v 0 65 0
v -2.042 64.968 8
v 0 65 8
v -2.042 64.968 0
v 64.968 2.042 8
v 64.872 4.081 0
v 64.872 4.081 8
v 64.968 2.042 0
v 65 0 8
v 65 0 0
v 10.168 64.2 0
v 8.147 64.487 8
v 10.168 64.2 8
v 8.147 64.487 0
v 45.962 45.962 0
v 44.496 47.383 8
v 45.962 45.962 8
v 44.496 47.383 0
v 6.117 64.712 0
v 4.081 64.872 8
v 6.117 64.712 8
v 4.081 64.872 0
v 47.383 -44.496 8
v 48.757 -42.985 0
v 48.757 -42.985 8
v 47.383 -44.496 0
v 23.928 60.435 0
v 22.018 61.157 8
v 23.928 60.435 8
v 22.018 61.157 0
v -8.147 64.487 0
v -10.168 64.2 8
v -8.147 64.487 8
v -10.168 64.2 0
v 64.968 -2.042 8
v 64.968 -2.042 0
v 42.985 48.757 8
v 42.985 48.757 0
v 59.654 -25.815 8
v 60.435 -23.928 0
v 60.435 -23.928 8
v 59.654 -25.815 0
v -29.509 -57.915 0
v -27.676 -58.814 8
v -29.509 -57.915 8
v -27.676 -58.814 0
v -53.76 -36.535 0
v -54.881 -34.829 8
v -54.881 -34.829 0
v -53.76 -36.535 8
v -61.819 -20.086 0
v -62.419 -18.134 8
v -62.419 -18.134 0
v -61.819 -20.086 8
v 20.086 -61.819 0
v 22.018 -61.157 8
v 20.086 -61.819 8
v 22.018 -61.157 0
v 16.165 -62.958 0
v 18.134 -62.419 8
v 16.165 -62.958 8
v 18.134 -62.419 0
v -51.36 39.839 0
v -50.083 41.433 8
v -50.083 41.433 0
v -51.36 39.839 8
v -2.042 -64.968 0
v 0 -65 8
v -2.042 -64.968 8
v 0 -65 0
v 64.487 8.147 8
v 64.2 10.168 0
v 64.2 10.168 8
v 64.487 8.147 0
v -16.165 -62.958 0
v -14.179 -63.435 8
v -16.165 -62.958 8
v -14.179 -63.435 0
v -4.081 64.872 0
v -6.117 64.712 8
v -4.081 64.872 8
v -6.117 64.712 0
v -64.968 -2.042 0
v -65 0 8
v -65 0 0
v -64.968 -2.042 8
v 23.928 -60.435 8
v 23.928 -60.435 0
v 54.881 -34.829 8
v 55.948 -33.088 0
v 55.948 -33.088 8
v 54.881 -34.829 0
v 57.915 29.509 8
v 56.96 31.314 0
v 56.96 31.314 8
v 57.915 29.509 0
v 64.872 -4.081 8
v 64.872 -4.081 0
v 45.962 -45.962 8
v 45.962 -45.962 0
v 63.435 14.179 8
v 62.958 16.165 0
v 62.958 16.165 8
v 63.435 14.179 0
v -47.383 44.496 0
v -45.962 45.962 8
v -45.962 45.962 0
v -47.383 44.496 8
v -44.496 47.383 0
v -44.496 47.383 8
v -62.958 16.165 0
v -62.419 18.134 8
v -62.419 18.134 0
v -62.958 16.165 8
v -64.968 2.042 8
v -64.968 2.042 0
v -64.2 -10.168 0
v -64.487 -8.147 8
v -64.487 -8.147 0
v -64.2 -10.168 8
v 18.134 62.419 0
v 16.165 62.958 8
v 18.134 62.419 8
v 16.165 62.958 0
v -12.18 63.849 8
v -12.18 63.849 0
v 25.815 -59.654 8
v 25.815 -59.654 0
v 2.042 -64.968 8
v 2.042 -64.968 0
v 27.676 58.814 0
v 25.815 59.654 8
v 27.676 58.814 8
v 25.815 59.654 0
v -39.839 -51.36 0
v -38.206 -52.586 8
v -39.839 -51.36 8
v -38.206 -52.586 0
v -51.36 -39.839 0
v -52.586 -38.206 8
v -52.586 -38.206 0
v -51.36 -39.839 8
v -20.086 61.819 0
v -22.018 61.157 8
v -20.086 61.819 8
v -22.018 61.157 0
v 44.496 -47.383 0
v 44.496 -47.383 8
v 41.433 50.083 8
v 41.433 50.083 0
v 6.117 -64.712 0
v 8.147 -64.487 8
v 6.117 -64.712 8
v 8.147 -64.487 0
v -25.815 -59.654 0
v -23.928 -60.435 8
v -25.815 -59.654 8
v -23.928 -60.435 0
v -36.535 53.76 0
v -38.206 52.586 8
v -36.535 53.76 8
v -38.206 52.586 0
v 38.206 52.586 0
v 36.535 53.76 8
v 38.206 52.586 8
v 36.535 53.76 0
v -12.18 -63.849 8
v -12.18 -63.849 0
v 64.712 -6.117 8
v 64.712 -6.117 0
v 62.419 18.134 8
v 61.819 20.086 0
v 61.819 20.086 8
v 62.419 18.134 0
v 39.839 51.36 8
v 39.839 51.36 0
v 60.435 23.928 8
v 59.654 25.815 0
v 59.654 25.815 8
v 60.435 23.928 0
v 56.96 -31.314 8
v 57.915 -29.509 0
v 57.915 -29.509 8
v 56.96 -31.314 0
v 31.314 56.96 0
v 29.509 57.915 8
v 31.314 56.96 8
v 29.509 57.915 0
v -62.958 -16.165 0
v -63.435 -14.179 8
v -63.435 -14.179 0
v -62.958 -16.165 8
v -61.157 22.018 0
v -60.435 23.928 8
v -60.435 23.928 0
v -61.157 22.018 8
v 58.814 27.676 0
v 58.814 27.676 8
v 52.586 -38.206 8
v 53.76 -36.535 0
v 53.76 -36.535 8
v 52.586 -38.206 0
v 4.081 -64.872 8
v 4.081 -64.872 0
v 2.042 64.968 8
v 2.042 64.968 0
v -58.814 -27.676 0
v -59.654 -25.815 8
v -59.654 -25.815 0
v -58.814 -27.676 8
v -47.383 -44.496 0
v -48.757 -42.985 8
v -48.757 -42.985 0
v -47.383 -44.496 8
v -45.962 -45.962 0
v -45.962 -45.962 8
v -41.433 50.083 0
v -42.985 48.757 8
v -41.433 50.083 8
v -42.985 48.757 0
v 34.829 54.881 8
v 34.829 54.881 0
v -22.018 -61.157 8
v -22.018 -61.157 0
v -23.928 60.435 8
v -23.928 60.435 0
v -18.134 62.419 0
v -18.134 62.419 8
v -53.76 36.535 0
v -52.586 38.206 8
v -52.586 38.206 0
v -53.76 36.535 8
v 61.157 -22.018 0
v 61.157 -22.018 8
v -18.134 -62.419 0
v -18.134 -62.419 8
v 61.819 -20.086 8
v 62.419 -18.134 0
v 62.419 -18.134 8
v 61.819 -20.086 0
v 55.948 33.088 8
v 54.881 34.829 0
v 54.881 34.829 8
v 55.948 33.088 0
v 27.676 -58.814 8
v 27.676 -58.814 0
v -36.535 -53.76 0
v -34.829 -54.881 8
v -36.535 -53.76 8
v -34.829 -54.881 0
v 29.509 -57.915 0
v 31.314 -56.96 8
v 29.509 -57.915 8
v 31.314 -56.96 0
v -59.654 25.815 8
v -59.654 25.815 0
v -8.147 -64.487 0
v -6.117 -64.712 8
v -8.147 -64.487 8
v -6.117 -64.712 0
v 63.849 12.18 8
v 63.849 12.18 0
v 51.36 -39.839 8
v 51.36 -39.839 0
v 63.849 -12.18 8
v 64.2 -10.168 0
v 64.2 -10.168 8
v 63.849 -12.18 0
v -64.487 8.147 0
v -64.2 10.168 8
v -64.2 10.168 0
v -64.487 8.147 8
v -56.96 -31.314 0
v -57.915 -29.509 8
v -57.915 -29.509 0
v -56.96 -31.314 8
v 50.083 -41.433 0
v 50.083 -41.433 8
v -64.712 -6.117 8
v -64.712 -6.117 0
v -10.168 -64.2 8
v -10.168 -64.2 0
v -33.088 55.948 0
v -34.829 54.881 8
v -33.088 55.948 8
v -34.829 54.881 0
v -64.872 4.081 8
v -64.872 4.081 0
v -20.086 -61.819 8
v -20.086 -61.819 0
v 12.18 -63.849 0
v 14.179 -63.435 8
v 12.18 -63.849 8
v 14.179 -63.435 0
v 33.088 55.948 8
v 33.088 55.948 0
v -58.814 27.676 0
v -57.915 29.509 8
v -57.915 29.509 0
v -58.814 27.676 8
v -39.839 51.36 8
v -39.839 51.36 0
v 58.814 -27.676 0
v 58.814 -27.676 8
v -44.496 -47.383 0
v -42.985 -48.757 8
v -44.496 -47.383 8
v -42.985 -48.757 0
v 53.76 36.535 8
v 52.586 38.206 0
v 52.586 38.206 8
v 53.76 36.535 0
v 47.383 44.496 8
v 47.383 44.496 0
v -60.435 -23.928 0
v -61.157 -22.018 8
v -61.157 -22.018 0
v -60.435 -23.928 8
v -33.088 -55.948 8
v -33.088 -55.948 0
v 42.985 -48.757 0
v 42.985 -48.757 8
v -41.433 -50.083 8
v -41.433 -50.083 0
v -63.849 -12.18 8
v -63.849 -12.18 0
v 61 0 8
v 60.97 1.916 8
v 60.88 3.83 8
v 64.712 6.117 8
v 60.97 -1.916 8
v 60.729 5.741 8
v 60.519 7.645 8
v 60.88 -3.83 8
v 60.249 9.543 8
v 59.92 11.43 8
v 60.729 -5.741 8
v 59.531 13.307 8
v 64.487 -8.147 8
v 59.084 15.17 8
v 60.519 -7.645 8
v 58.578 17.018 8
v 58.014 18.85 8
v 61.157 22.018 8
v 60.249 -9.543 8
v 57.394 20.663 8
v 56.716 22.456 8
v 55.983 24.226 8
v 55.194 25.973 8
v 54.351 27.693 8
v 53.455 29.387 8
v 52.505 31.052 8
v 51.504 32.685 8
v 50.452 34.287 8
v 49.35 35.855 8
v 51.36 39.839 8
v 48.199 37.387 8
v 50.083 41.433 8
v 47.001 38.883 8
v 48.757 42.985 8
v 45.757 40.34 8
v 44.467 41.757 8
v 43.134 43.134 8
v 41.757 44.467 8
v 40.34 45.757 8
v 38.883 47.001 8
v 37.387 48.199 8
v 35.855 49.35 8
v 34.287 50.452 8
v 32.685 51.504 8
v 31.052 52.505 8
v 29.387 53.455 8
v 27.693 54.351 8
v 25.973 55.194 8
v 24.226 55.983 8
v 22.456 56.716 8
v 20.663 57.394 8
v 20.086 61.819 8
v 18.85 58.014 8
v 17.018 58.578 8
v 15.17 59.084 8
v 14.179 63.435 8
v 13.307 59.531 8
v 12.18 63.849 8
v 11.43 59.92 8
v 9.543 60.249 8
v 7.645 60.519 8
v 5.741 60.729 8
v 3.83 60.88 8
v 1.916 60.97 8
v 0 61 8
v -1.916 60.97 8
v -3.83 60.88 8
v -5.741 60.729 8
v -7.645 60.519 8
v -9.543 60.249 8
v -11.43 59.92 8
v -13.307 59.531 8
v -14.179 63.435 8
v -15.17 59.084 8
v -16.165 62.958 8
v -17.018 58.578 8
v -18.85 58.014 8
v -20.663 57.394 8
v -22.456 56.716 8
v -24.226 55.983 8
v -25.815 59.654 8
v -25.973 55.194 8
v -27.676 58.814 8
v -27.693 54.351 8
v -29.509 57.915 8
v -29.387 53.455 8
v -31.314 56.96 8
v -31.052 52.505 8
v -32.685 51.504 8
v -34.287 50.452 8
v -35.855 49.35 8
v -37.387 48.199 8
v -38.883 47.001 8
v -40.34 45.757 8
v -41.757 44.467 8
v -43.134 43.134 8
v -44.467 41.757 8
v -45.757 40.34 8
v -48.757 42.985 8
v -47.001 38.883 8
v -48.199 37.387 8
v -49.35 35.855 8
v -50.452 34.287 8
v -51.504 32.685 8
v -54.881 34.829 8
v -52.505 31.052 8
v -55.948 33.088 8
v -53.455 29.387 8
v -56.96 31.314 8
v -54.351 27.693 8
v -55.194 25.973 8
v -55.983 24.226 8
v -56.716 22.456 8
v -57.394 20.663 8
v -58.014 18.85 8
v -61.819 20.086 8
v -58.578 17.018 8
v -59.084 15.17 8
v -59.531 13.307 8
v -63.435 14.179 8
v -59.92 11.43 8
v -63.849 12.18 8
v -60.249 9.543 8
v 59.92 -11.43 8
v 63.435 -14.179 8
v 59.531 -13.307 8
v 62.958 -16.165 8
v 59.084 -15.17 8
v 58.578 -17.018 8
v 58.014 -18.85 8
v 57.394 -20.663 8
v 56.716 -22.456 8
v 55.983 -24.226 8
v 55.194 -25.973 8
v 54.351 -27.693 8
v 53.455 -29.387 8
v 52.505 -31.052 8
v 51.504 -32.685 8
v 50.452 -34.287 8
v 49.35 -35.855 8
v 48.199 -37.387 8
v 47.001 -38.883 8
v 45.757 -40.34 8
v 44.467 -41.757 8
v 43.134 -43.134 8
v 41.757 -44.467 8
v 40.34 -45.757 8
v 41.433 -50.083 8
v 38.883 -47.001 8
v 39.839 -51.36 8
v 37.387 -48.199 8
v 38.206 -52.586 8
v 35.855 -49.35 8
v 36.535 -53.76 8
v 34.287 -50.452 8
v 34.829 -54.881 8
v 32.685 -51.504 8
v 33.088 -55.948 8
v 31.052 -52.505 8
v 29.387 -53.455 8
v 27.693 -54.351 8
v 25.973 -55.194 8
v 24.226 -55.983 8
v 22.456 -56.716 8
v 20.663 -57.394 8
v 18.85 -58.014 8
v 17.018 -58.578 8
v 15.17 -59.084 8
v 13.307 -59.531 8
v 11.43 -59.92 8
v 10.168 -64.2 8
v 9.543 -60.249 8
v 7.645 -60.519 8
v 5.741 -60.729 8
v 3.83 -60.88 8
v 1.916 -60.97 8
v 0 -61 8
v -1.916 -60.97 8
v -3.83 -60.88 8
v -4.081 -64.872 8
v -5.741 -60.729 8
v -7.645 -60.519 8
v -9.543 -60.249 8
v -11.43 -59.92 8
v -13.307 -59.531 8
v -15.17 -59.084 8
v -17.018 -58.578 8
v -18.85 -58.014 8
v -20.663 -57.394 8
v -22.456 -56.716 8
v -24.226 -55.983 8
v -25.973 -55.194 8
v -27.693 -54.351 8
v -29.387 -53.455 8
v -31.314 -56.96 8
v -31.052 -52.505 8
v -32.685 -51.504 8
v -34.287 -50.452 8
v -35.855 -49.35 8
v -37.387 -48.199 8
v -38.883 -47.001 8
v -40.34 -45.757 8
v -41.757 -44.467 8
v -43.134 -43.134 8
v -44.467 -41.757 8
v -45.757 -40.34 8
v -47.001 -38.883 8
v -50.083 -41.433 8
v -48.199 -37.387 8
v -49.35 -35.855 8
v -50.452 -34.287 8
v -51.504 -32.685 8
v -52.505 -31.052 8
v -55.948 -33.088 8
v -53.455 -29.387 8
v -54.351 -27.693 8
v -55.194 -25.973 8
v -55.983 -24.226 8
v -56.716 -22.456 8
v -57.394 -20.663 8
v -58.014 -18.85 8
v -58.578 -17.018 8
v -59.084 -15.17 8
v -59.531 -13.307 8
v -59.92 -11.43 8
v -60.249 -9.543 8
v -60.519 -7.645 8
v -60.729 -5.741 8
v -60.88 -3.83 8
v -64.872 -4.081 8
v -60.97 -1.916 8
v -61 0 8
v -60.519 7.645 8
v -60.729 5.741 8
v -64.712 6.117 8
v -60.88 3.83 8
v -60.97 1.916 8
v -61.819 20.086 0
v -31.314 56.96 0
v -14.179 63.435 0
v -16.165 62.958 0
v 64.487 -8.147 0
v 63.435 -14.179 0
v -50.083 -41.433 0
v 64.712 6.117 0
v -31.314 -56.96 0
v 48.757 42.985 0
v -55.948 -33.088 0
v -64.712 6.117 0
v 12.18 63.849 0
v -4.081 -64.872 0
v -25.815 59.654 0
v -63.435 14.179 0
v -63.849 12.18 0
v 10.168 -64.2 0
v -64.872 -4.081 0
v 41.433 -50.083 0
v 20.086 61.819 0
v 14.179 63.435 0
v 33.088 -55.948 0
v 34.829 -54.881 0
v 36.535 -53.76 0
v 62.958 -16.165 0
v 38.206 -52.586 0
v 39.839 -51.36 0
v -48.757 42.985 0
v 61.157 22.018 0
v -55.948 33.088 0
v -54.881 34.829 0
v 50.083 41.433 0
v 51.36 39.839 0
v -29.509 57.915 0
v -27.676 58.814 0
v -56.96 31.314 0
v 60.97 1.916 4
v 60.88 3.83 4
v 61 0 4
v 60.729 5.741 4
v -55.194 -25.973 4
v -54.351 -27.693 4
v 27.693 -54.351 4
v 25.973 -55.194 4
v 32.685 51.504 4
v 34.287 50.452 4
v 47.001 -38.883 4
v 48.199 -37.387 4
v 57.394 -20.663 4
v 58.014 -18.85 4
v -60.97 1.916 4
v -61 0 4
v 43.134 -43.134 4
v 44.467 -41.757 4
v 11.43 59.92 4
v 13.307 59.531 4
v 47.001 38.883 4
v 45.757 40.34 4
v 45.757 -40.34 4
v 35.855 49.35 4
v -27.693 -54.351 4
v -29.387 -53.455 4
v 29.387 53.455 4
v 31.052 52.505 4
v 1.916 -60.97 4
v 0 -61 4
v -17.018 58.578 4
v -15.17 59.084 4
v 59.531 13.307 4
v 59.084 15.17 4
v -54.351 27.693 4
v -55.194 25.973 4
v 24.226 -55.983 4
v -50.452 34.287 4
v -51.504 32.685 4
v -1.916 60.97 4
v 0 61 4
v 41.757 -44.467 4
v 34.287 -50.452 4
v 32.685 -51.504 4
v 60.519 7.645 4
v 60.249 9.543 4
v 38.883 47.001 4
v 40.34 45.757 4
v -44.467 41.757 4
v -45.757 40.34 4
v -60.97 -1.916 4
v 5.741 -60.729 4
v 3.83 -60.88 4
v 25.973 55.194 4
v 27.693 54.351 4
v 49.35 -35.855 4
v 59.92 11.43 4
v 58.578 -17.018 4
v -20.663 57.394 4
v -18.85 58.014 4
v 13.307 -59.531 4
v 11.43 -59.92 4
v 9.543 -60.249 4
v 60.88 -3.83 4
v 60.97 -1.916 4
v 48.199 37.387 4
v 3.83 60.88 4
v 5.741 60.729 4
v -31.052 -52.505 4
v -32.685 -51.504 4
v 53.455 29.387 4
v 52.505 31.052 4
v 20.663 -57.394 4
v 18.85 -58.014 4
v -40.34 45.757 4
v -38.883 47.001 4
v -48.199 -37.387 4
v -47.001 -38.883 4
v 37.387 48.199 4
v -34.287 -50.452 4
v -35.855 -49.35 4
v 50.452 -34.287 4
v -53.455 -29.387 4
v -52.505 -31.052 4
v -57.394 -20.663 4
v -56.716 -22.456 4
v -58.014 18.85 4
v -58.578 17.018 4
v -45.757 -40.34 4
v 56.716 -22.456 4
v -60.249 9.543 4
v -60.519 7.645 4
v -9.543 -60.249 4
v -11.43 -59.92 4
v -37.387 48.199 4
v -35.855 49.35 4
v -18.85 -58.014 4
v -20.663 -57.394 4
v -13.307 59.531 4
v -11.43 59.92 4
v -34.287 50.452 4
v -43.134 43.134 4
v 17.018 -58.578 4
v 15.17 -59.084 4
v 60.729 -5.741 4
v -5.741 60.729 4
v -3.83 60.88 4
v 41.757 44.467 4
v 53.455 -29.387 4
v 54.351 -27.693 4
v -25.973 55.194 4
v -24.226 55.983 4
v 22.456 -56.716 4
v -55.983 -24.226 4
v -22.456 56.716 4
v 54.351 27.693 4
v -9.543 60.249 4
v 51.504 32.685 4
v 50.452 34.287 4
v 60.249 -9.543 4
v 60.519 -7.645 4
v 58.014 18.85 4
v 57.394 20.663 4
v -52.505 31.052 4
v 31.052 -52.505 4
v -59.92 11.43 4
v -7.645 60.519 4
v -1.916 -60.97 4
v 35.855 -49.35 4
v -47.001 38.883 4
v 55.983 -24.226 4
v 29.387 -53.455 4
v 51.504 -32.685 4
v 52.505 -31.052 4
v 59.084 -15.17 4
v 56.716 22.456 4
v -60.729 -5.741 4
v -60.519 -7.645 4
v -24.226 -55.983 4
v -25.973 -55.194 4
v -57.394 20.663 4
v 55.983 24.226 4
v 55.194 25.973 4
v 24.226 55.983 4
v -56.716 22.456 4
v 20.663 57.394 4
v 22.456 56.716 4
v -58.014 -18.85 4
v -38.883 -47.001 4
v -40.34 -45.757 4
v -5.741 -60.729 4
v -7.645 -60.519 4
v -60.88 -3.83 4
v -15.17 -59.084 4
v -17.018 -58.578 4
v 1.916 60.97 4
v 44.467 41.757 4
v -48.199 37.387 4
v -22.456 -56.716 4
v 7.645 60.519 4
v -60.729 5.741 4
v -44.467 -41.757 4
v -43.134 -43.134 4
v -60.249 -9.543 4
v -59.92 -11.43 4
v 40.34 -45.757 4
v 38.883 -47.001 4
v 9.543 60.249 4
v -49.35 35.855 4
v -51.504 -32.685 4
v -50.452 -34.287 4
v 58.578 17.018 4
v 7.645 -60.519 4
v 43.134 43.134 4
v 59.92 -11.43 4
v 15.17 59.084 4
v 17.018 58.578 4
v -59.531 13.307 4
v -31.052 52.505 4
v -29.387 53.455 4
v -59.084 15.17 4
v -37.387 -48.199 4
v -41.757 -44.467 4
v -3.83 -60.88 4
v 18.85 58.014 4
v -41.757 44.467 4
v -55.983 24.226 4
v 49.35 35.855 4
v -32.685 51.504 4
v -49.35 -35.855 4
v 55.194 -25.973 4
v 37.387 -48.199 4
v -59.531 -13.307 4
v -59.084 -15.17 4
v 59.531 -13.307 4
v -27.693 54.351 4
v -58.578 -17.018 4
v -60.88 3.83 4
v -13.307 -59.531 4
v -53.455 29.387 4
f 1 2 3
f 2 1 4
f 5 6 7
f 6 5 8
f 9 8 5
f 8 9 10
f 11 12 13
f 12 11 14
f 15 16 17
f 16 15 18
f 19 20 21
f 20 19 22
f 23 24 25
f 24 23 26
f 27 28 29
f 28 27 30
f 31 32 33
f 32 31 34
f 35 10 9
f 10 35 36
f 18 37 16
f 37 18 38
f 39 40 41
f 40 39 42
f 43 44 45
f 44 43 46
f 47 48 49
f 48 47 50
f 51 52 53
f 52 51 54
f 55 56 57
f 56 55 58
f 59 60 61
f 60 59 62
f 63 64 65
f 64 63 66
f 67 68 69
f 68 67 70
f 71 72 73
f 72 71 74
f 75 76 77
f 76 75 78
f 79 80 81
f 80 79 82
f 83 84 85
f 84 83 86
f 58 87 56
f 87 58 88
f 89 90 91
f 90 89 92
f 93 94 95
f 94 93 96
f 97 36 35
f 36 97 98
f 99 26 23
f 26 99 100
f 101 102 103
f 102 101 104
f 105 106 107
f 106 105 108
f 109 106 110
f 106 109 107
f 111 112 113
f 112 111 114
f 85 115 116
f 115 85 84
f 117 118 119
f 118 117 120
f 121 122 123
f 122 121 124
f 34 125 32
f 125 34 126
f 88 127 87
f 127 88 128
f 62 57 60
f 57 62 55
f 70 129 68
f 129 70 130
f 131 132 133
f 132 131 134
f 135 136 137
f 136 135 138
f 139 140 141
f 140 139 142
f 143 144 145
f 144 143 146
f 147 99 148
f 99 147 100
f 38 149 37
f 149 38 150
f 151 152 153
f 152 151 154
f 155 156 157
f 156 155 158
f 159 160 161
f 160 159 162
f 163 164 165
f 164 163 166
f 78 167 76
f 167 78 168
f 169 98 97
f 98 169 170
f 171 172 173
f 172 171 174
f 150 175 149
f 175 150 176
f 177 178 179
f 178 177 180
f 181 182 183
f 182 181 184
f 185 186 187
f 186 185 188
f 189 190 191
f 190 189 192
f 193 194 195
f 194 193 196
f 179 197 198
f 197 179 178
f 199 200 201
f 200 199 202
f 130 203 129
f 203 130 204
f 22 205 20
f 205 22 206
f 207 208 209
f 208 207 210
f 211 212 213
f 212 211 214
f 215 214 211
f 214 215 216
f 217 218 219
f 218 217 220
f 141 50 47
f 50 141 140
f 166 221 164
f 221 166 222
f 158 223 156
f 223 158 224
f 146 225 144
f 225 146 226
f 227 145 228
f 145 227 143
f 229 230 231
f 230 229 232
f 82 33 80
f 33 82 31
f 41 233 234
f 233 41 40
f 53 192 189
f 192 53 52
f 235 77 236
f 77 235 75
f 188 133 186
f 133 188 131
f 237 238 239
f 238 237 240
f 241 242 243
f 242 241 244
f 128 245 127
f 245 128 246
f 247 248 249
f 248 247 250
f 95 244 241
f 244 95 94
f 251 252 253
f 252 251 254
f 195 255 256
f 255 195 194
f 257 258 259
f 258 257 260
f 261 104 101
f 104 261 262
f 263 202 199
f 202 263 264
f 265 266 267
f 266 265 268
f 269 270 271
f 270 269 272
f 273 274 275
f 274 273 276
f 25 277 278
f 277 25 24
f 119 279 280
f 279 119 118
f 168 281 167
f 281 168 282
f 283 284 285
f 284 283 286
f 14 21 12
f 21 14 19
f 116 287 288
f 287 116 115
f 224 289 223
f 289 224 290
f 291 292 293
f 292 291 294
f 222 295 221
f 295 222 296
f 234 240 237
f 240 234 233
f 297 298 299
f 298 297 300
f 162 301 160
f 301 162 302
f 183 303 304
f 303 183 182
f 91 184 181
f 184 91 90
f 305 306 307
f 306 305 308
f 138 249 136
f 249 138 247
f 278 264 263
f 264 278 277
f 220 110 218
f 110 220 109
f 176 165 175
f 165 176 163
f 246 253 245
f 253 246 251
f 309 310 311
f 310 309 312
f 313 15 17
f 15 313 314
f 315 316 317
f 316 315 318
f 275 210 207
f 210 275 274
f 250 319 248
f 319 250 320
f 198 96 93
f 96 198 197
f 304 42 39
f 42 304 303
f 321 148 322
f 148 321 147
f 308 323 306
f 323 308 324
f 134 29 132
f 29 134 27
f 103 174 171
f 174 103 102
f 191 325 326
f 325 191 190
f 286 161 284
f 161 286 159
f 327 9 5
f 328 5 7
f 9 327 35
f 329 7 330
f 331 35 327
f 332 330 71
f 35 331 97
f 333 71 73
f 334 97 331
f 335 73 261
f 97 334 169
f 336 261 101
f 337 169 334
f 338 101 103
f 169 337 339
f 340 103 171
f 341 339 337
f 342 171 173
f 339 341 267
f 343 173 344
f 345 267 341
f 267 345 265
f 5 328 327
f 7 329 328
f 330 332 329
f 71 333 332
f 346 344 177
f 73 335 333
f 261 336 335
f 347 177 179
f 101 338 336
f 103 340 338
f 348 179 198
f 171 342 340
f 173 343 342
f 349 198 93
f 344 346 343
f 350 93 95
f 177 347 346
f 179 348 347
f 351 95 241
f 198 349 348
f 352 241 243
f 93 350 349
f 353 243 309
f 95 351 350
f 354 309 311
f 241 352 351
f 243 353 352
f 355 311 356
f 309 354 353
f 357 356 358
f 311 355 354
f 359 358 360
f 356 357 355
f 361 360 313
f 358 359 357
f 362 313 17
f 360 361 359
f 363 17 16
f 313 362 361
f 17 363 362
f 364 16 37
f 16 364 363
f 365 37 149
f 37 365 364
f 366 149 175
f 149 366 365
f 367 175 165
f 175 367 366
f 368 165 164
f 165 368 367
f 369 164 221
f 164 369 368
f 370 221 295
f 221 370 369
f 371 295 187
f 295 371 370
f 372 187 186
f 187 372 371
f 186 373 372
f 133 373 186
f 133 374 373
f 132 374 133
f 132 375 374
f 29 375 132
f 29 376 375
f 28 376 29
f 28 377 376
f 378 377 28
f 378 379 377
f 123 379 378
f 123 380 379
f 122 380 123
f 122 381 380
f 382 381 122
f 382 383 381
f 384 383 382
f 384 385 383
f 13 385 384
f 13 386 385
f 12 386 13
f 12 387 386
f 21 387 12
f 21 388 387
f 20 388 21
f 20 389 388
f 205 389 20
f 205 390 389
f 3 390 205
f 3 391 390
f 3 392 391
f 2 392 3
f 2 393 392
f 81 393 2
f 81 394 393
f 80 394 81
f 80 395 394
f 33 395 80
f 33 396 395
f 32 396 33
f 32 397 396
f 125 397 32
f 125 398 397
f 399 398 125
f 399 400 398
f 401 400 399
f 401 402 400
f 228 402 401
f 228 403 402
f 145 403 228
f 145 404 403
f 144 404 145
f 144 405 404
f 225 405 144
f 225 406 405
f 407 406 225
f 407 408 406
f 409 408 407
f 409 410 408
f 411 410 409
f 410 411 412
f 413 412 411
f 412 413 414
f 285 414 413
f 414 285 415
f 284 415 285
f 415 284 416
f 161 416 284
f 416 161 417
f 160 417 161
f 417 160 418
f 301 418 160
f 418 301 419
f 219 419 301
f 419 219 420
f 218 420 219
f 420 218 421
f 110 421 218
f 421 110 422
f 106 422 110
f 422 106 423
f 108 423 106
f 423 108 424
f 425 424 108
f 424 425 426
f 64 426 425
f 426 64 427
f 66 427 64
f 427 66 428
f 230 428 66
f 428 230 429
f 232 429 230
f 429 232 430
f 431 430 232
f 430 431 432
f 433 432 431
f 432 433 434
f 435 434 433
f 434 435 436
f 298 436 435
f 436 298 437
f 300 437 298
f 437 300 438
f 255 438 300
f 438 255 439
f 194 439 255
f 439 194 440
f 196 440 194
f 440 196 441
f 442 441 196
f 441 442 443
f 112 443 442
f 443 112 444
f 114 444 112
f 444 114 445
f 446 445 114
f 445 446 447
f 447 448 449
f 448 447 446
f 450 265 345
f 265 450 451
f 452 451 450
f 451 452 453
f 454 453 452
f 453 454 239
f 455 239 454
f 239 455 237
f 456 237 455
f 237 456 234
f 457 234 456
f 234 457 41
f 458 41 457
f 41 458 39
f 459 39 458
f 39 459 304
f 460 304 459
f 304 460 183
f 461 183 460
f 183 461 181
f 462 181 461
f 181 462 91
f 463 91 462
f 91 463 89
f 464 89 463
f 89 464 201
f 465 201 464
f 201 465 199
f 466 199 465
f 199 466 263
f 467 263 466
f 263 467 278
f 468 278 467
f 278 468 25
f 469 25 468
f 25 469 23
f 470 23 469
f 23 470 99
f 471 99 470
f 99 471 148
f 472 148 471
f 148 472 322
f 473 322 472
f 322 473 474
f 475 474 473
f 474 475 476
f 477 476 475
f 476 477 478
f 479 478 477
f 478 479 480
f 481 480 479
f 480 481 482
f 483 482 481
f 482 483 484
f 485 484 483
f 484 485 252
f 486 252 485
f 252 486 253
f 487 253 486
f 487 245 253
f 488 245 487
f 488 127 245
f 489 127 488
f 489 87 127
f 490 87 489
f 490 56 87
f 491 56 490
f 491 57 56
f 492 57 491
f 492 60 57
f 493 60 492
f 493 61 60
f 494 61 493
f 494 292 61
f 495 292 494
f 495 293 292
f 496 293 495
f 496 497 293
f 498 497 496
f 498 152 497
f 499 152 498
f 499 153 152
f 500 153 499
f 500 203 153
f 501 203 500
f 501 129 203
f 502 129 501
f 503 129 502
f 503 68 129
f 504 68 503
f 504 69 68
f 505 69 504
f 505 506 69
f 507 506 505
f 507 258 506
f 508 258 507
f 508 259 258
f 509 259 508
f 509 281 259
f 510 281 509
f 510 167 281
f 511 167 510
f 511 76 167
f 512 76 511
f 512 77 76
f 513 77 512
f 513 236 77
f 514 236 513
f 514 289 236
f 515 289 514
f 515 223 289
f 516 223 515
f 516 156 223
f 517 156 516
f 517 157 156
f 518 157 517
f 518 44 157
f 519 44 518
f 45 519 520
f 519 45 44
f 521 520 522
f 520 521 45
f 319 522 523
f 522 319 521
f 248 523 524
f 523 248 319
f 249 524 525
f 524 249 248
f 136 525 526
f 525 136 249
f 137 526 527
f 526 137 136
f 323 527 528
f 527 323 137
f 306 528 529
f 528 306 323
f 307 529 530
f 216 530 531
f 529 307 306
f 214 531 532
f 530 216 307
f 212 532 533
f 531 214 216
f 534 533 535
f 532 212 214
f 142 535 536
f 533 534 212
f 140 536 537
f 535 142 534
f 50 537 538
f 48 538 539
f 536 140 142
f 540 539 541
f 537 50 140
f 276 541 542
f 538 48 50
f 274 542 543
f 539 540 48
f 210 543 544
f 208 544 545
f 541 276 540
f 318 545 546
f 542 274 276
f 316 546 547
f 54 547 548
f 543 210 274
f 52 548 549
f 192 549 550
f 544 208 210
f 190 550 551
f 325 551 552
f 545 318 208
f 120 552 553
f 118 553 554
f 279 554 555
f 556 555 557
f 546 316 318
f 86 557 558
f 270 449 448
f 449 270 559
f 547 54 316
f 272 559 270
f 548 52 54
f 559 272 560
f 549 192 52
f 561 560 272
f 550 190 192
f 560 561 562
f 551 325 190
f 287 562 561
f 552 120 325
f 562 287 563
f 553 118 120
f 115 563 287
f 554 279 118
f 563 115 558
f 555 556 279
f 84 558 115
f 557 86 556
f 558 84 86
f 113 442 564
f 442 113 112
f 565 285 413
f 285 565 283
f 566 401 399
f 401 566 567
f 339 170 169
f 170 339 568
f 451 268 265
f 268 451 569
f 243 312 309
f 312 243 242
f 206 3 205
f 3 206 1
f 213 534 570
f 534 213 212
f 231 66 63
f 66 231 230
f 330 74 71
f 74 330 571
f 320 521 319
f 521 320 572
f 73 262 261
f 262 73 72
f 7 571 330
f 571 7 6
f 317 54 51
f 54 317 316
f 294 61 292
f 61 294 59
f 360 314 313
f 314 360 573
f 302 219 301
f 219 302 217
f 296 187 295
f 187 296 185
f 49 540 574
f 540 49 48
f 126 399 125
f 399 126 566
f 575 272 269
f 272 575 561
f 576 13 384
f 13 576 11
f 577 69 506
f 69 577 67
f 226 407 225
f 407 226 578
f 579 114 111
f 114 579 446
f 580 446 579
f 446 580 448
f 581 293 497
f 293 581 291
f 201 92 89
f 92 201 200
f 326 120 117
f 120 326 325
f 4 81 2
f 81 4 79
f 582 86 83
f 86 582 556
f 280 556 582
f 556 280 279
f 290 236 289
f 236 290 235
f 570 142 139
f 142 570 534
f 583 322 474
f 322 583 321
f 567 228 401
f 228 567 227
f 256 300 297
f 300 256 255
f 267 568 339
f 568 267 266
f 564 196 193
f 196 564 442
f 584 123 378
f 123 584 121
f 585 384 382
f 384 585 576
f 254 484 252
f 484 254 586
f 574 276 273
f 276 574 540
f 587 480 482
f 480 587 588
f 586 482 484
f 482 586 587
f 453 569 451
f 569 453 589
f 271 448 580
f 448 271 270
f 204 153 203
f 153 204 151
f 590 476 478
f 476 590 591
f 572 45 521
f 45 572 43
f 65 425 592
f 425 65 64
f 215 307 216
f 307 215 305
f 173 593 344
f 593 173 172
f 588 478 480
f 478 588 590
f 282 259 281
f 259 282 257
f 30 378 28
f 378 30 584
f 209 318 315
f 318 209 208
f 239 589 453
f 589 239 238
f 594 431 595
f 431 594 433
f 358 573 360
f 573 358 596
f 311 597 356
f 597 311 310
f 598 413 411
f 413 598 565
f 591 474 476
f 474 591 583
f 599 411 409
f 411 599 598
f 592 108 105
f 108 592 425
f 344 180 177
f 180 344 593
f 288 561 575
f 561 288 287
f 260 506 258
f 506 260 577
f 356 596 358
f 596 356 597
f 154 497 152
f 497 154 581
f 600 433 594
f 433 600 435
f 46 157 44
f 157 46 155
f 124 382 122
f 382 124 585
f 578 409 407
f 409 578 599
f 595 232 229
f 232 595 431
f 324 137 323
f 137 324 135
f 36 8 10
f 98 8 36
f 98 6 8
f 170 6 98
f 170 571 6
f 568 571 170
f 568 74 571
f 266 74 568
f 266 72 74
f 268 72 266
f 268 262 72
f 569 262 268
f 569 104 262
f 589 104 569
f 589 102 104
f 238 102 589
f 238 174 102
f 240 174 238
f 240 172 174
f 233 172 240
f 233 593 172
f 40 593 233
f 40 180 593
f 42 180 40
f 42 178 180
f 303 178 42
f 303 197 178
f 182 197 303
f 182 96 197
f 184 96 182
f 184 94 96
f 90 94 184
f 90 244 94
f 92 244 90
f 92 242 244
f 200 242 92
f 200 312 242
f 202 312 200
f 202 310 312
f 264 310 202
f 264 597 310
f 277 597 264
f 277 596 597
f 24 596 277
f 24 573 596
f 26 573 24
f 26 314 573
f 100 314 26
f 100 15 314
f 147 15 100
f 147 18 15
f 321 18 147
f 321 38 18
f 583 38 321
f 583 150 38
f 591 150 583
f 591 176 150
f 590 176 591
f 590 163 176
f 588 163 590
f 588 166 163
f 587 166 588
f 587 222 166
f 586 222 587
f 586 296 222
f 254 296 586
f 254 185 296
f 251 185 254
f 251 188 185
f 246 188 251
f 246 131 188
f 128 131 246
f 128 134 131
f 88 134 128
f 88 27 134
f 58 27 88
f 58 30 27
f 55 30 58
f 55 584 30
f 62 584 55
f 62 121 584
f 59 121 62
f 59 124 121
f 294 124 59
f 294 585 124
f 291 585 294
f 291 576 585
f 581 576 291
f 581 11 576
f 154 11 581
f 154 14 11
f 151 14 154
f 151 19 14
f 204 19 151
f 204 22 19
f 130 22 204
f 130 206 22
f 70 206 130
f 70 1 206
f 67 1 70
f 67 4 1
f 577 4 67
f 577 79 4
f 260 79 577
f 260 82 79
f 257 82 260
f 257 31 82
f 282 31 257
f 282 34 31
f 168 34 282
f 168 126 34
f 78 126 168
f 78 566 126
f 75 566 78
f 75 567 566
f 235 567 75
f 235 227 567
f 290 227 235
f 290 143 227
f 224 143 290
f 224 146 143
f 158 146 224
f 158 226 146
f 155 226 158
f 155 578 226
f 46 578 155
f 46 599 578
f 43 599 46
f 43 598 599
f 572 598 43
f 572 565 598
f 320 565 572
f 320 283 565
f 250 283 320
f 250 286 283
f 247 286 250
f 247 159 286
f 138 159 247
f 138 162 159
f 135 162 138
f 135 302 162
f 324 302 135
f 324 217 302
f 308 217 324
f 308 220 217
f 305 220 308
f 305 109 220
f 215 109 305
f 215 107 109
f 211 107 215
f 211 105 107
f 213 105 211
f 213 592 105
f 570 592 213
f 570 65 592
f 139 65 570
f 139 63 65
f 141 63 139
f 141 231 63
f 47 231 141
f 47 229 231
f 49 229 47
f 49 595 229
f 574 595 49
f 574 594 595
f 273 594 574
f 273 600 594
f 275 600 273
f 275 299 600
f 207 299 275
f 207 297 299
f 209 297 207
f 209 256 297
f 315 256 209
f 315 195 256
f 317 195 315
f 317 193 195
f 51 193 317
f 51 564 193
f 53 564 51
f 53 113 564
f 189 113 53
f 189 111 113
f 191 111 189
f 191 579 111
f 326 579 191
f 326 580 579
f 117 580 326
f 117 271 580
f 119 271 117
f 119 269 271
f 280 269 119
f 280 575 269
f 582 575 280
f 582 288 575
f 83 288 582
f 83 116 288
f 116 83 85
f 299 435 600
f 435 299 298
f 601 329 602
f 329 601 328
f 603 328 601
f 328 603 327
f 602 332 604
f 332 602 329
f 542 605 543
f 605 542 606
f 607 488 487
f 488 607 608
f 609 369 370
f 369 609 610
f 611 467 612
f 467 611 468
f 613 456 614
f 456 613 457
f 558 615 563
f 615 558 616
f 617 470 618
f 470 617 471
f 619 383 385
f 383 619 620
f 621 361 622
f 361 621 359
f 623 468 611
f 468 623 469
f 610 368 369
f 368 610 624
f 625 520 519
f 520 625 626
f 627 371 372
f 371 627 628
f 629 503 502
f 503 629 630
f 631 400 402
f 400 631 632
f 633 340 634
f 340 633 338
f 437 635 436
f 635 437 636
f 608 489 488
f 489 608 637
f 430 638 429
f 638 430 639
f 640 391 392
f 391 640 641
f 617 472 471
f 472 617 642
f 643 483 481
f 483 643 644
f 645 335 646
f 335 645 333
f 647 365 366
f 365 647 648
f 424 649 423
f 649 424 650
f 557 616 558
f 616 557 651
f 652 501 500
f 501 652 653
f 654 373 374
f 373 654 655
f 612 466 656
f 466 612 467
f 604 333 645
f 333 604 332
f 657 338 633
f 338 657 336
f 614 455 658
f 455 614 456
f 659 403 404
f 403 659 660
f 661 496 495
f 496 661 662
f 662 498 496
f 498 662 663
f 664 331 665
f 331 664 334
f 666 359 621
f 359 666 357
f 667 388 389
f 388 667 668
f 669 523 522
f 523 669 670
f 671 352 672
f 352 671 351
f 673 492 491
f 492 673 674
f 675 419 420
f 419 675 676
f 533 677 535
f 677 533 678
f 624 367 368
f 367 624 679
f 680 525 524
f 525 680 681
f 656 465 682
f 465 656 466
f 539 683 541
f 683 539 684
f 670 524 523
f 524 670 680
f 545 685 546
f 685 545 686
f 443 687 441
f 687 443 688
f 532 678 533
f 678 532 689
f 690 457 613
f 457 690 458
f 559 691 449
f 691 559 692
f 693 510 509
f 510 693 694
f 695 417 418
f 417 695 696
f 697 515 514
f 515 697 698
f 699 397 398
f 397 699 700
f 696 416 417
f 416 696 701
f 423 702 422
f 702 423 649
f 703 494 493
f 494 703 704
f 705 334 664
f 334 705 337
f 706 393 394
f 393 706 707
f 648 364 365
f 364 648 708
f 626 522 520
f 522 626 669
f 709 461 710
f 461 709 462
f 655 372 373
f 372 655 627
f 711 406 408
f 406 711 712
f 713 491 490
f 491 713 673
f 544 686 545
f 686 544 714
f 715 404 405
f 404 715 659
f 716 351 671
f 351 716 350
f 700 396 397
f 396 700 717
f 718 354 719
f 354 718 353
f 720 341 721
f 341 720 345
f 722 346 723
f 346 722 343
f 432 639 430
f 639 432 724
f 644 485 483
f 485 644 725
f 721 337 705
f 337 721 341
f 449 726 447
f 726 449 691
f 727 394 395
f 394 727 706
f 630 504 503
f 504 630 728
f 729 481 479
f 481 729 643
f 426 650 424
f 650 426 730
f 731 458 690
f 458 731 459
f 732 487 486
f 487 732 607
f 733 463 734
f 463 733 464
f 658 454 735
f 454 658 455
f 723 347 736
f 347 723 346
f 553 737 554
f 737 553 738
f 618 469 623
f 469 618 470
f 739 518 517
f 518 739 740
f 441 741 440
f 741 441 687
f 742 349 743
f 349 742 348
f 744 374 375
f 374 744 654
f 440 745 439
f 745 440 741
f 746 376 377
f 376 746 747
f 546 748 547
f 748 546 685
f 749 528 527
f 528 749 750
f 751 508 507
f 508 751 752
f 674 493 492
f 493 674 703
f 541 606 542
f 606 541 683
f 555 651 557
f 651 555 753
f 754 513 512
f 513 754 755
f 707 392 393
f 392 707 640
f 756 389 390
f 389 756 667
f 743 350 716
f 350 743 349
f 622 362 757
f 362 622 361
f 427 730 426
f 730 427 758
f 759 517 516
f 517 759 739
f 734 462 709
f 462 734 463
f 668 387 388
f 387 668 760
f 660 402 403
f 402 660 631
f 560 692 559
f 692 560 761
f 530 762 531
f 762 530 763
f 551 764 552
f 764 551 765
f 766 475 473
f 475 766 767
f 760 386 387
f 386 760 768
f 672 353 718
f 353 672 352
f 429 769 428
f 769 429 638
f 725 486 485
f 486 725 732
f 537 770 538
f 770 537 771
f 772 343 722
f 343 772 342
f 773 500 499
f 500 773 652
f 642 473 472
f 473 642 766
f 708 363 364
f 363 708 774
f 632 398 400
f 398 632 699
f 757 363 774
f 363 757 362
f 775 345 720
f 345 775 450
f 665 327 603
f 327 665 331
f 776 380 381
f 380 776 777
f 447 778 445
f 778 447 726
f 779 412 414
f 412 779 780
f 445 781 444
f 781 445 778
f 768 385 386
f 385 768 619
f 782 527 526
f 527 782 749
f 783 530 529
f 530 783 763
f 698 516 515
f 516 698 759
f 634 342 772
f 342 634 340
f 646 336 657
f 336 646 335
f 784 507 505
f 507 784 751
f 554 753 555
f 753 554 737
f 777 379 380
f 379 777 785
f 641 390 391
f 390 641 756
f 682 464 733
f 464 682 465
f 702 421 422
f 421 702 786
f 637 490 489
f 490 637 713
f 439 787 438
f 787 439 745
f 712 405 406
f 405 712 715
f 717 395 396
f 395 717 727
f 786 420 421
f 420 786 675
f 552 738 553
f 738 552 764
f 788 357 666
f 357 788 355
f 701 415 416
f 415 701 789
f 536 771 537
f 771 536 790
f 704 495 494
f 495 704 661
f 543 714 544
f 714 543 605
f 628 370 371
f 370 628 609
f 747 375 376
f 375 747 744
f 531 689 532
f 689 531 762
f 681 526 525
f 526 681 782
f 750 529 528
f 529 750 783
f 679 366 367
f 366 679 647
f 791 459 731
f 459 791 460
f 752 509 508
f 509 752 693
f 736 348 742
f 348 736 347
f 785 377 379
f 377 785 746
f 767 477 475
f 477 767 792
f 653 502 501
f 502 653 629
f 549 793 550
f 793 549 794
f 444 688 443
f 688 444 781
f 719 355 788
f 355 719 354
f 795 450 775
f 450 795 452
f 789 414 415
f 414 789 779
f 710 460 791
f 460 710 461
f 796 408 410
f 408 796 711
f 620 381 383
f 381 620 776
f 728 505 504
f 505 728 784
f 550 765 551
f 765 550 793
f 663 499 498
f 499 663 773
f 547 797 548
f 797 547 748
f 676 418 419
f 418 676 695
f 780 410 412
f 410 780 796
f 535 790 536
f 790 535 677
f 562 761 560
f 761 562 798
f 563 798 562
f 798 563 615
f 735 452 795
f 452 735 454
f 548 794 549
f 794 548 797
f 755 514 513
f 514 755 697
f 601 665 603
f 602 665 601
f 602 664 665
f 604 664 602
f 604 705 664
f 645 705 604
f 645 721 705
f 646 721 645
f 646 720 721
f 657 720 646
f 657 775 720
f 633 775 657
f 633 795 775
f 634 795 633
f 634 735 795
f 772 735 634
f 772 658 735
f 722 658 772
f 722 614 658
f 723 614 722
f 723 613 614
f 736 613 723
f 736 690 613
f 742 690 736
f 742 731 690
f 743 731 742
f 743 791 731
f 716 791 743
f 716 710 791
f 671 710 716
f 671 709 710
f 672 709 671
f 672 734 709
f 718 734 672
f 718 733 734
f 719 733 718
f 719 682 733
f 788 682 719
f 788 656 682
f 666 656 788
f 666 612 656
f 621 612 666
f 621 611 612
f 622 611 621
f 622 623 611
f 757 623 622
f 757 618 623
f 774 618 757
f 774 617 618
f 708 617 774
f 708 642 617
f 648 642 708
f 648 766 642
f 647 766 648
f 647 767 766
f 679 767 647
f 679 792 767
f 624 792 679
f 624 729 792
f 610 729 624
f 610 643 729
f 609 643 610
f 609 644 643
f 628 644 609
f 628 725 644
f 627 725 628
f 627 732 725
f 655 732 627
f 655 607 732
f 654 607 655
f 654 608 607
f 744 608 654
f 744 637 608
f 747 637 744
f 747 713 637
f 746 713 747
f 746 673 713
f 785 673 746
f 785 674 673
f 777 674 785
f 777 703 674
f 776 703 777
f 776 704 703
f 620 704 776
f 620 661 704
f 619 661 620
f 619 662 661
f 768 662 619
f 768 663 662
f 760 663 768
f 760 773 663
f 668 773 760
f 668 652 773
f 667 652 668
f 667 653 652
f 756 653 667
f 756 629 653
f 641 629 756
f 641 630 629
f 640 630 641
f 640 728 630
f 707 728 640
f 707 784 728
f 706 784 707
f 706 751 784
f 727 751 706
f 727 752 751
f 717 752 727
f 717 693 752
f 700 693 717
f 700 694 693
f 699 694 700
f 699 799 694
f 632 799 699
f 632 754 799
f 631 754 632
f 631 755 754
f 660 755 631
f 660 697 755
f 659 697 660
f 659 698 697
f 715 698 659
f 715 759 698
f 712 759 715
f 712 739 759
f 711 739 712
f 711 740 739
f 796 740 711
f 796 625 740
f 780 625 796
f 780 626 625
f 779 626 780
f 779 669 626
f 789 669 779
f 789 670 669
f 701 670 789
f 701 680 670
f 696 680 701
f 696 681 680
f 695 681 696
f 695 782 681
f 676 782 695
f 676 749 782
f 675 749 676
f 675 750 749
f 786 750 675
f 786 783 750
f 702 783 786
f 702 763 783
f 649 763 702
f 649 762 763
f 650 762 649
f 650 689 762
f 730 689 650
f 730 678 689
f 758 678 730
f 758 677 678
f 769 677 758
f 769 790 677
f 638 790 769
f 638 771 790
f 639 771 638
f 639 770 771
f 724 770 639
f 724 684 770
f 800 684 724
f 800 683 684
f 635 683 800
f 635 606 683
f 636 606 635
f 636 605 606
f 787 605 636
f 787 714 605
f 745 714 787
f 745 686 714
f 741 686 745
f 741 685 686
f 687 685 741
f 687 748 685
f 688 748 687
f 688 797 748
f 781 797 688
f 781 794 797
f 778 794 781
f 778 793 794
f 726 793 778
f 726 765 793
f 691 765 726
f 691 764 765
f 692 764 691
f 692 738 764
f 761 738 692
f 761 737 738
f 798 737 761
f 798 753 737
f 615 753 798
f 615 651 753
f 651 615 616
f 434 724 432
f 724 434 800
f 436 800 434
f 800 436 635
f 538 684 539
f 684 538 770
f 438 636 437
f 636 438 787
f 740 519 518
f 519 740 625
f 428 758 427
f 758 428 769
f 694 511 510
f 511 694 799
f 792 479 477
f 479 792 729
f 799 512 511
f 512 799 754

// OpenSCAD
// [FL_INDEX: keywords="openscad, 3d_parametric, Customizable_drink_coaster, csg_solid" | COT="Parametric OpenSCAD design from 3DCodeverse"]
// Title: Customizable drink coaster

// Diameter of drink coaster [mm]
outerDiameter=130;

difference() {
	cylinder(h = 8, r=outerDiameter/2, $fn=200);
	translate([0,0,4])
		cylinder(h = 4, r=(outerDiameter/2)-4, $fn=200);
}
